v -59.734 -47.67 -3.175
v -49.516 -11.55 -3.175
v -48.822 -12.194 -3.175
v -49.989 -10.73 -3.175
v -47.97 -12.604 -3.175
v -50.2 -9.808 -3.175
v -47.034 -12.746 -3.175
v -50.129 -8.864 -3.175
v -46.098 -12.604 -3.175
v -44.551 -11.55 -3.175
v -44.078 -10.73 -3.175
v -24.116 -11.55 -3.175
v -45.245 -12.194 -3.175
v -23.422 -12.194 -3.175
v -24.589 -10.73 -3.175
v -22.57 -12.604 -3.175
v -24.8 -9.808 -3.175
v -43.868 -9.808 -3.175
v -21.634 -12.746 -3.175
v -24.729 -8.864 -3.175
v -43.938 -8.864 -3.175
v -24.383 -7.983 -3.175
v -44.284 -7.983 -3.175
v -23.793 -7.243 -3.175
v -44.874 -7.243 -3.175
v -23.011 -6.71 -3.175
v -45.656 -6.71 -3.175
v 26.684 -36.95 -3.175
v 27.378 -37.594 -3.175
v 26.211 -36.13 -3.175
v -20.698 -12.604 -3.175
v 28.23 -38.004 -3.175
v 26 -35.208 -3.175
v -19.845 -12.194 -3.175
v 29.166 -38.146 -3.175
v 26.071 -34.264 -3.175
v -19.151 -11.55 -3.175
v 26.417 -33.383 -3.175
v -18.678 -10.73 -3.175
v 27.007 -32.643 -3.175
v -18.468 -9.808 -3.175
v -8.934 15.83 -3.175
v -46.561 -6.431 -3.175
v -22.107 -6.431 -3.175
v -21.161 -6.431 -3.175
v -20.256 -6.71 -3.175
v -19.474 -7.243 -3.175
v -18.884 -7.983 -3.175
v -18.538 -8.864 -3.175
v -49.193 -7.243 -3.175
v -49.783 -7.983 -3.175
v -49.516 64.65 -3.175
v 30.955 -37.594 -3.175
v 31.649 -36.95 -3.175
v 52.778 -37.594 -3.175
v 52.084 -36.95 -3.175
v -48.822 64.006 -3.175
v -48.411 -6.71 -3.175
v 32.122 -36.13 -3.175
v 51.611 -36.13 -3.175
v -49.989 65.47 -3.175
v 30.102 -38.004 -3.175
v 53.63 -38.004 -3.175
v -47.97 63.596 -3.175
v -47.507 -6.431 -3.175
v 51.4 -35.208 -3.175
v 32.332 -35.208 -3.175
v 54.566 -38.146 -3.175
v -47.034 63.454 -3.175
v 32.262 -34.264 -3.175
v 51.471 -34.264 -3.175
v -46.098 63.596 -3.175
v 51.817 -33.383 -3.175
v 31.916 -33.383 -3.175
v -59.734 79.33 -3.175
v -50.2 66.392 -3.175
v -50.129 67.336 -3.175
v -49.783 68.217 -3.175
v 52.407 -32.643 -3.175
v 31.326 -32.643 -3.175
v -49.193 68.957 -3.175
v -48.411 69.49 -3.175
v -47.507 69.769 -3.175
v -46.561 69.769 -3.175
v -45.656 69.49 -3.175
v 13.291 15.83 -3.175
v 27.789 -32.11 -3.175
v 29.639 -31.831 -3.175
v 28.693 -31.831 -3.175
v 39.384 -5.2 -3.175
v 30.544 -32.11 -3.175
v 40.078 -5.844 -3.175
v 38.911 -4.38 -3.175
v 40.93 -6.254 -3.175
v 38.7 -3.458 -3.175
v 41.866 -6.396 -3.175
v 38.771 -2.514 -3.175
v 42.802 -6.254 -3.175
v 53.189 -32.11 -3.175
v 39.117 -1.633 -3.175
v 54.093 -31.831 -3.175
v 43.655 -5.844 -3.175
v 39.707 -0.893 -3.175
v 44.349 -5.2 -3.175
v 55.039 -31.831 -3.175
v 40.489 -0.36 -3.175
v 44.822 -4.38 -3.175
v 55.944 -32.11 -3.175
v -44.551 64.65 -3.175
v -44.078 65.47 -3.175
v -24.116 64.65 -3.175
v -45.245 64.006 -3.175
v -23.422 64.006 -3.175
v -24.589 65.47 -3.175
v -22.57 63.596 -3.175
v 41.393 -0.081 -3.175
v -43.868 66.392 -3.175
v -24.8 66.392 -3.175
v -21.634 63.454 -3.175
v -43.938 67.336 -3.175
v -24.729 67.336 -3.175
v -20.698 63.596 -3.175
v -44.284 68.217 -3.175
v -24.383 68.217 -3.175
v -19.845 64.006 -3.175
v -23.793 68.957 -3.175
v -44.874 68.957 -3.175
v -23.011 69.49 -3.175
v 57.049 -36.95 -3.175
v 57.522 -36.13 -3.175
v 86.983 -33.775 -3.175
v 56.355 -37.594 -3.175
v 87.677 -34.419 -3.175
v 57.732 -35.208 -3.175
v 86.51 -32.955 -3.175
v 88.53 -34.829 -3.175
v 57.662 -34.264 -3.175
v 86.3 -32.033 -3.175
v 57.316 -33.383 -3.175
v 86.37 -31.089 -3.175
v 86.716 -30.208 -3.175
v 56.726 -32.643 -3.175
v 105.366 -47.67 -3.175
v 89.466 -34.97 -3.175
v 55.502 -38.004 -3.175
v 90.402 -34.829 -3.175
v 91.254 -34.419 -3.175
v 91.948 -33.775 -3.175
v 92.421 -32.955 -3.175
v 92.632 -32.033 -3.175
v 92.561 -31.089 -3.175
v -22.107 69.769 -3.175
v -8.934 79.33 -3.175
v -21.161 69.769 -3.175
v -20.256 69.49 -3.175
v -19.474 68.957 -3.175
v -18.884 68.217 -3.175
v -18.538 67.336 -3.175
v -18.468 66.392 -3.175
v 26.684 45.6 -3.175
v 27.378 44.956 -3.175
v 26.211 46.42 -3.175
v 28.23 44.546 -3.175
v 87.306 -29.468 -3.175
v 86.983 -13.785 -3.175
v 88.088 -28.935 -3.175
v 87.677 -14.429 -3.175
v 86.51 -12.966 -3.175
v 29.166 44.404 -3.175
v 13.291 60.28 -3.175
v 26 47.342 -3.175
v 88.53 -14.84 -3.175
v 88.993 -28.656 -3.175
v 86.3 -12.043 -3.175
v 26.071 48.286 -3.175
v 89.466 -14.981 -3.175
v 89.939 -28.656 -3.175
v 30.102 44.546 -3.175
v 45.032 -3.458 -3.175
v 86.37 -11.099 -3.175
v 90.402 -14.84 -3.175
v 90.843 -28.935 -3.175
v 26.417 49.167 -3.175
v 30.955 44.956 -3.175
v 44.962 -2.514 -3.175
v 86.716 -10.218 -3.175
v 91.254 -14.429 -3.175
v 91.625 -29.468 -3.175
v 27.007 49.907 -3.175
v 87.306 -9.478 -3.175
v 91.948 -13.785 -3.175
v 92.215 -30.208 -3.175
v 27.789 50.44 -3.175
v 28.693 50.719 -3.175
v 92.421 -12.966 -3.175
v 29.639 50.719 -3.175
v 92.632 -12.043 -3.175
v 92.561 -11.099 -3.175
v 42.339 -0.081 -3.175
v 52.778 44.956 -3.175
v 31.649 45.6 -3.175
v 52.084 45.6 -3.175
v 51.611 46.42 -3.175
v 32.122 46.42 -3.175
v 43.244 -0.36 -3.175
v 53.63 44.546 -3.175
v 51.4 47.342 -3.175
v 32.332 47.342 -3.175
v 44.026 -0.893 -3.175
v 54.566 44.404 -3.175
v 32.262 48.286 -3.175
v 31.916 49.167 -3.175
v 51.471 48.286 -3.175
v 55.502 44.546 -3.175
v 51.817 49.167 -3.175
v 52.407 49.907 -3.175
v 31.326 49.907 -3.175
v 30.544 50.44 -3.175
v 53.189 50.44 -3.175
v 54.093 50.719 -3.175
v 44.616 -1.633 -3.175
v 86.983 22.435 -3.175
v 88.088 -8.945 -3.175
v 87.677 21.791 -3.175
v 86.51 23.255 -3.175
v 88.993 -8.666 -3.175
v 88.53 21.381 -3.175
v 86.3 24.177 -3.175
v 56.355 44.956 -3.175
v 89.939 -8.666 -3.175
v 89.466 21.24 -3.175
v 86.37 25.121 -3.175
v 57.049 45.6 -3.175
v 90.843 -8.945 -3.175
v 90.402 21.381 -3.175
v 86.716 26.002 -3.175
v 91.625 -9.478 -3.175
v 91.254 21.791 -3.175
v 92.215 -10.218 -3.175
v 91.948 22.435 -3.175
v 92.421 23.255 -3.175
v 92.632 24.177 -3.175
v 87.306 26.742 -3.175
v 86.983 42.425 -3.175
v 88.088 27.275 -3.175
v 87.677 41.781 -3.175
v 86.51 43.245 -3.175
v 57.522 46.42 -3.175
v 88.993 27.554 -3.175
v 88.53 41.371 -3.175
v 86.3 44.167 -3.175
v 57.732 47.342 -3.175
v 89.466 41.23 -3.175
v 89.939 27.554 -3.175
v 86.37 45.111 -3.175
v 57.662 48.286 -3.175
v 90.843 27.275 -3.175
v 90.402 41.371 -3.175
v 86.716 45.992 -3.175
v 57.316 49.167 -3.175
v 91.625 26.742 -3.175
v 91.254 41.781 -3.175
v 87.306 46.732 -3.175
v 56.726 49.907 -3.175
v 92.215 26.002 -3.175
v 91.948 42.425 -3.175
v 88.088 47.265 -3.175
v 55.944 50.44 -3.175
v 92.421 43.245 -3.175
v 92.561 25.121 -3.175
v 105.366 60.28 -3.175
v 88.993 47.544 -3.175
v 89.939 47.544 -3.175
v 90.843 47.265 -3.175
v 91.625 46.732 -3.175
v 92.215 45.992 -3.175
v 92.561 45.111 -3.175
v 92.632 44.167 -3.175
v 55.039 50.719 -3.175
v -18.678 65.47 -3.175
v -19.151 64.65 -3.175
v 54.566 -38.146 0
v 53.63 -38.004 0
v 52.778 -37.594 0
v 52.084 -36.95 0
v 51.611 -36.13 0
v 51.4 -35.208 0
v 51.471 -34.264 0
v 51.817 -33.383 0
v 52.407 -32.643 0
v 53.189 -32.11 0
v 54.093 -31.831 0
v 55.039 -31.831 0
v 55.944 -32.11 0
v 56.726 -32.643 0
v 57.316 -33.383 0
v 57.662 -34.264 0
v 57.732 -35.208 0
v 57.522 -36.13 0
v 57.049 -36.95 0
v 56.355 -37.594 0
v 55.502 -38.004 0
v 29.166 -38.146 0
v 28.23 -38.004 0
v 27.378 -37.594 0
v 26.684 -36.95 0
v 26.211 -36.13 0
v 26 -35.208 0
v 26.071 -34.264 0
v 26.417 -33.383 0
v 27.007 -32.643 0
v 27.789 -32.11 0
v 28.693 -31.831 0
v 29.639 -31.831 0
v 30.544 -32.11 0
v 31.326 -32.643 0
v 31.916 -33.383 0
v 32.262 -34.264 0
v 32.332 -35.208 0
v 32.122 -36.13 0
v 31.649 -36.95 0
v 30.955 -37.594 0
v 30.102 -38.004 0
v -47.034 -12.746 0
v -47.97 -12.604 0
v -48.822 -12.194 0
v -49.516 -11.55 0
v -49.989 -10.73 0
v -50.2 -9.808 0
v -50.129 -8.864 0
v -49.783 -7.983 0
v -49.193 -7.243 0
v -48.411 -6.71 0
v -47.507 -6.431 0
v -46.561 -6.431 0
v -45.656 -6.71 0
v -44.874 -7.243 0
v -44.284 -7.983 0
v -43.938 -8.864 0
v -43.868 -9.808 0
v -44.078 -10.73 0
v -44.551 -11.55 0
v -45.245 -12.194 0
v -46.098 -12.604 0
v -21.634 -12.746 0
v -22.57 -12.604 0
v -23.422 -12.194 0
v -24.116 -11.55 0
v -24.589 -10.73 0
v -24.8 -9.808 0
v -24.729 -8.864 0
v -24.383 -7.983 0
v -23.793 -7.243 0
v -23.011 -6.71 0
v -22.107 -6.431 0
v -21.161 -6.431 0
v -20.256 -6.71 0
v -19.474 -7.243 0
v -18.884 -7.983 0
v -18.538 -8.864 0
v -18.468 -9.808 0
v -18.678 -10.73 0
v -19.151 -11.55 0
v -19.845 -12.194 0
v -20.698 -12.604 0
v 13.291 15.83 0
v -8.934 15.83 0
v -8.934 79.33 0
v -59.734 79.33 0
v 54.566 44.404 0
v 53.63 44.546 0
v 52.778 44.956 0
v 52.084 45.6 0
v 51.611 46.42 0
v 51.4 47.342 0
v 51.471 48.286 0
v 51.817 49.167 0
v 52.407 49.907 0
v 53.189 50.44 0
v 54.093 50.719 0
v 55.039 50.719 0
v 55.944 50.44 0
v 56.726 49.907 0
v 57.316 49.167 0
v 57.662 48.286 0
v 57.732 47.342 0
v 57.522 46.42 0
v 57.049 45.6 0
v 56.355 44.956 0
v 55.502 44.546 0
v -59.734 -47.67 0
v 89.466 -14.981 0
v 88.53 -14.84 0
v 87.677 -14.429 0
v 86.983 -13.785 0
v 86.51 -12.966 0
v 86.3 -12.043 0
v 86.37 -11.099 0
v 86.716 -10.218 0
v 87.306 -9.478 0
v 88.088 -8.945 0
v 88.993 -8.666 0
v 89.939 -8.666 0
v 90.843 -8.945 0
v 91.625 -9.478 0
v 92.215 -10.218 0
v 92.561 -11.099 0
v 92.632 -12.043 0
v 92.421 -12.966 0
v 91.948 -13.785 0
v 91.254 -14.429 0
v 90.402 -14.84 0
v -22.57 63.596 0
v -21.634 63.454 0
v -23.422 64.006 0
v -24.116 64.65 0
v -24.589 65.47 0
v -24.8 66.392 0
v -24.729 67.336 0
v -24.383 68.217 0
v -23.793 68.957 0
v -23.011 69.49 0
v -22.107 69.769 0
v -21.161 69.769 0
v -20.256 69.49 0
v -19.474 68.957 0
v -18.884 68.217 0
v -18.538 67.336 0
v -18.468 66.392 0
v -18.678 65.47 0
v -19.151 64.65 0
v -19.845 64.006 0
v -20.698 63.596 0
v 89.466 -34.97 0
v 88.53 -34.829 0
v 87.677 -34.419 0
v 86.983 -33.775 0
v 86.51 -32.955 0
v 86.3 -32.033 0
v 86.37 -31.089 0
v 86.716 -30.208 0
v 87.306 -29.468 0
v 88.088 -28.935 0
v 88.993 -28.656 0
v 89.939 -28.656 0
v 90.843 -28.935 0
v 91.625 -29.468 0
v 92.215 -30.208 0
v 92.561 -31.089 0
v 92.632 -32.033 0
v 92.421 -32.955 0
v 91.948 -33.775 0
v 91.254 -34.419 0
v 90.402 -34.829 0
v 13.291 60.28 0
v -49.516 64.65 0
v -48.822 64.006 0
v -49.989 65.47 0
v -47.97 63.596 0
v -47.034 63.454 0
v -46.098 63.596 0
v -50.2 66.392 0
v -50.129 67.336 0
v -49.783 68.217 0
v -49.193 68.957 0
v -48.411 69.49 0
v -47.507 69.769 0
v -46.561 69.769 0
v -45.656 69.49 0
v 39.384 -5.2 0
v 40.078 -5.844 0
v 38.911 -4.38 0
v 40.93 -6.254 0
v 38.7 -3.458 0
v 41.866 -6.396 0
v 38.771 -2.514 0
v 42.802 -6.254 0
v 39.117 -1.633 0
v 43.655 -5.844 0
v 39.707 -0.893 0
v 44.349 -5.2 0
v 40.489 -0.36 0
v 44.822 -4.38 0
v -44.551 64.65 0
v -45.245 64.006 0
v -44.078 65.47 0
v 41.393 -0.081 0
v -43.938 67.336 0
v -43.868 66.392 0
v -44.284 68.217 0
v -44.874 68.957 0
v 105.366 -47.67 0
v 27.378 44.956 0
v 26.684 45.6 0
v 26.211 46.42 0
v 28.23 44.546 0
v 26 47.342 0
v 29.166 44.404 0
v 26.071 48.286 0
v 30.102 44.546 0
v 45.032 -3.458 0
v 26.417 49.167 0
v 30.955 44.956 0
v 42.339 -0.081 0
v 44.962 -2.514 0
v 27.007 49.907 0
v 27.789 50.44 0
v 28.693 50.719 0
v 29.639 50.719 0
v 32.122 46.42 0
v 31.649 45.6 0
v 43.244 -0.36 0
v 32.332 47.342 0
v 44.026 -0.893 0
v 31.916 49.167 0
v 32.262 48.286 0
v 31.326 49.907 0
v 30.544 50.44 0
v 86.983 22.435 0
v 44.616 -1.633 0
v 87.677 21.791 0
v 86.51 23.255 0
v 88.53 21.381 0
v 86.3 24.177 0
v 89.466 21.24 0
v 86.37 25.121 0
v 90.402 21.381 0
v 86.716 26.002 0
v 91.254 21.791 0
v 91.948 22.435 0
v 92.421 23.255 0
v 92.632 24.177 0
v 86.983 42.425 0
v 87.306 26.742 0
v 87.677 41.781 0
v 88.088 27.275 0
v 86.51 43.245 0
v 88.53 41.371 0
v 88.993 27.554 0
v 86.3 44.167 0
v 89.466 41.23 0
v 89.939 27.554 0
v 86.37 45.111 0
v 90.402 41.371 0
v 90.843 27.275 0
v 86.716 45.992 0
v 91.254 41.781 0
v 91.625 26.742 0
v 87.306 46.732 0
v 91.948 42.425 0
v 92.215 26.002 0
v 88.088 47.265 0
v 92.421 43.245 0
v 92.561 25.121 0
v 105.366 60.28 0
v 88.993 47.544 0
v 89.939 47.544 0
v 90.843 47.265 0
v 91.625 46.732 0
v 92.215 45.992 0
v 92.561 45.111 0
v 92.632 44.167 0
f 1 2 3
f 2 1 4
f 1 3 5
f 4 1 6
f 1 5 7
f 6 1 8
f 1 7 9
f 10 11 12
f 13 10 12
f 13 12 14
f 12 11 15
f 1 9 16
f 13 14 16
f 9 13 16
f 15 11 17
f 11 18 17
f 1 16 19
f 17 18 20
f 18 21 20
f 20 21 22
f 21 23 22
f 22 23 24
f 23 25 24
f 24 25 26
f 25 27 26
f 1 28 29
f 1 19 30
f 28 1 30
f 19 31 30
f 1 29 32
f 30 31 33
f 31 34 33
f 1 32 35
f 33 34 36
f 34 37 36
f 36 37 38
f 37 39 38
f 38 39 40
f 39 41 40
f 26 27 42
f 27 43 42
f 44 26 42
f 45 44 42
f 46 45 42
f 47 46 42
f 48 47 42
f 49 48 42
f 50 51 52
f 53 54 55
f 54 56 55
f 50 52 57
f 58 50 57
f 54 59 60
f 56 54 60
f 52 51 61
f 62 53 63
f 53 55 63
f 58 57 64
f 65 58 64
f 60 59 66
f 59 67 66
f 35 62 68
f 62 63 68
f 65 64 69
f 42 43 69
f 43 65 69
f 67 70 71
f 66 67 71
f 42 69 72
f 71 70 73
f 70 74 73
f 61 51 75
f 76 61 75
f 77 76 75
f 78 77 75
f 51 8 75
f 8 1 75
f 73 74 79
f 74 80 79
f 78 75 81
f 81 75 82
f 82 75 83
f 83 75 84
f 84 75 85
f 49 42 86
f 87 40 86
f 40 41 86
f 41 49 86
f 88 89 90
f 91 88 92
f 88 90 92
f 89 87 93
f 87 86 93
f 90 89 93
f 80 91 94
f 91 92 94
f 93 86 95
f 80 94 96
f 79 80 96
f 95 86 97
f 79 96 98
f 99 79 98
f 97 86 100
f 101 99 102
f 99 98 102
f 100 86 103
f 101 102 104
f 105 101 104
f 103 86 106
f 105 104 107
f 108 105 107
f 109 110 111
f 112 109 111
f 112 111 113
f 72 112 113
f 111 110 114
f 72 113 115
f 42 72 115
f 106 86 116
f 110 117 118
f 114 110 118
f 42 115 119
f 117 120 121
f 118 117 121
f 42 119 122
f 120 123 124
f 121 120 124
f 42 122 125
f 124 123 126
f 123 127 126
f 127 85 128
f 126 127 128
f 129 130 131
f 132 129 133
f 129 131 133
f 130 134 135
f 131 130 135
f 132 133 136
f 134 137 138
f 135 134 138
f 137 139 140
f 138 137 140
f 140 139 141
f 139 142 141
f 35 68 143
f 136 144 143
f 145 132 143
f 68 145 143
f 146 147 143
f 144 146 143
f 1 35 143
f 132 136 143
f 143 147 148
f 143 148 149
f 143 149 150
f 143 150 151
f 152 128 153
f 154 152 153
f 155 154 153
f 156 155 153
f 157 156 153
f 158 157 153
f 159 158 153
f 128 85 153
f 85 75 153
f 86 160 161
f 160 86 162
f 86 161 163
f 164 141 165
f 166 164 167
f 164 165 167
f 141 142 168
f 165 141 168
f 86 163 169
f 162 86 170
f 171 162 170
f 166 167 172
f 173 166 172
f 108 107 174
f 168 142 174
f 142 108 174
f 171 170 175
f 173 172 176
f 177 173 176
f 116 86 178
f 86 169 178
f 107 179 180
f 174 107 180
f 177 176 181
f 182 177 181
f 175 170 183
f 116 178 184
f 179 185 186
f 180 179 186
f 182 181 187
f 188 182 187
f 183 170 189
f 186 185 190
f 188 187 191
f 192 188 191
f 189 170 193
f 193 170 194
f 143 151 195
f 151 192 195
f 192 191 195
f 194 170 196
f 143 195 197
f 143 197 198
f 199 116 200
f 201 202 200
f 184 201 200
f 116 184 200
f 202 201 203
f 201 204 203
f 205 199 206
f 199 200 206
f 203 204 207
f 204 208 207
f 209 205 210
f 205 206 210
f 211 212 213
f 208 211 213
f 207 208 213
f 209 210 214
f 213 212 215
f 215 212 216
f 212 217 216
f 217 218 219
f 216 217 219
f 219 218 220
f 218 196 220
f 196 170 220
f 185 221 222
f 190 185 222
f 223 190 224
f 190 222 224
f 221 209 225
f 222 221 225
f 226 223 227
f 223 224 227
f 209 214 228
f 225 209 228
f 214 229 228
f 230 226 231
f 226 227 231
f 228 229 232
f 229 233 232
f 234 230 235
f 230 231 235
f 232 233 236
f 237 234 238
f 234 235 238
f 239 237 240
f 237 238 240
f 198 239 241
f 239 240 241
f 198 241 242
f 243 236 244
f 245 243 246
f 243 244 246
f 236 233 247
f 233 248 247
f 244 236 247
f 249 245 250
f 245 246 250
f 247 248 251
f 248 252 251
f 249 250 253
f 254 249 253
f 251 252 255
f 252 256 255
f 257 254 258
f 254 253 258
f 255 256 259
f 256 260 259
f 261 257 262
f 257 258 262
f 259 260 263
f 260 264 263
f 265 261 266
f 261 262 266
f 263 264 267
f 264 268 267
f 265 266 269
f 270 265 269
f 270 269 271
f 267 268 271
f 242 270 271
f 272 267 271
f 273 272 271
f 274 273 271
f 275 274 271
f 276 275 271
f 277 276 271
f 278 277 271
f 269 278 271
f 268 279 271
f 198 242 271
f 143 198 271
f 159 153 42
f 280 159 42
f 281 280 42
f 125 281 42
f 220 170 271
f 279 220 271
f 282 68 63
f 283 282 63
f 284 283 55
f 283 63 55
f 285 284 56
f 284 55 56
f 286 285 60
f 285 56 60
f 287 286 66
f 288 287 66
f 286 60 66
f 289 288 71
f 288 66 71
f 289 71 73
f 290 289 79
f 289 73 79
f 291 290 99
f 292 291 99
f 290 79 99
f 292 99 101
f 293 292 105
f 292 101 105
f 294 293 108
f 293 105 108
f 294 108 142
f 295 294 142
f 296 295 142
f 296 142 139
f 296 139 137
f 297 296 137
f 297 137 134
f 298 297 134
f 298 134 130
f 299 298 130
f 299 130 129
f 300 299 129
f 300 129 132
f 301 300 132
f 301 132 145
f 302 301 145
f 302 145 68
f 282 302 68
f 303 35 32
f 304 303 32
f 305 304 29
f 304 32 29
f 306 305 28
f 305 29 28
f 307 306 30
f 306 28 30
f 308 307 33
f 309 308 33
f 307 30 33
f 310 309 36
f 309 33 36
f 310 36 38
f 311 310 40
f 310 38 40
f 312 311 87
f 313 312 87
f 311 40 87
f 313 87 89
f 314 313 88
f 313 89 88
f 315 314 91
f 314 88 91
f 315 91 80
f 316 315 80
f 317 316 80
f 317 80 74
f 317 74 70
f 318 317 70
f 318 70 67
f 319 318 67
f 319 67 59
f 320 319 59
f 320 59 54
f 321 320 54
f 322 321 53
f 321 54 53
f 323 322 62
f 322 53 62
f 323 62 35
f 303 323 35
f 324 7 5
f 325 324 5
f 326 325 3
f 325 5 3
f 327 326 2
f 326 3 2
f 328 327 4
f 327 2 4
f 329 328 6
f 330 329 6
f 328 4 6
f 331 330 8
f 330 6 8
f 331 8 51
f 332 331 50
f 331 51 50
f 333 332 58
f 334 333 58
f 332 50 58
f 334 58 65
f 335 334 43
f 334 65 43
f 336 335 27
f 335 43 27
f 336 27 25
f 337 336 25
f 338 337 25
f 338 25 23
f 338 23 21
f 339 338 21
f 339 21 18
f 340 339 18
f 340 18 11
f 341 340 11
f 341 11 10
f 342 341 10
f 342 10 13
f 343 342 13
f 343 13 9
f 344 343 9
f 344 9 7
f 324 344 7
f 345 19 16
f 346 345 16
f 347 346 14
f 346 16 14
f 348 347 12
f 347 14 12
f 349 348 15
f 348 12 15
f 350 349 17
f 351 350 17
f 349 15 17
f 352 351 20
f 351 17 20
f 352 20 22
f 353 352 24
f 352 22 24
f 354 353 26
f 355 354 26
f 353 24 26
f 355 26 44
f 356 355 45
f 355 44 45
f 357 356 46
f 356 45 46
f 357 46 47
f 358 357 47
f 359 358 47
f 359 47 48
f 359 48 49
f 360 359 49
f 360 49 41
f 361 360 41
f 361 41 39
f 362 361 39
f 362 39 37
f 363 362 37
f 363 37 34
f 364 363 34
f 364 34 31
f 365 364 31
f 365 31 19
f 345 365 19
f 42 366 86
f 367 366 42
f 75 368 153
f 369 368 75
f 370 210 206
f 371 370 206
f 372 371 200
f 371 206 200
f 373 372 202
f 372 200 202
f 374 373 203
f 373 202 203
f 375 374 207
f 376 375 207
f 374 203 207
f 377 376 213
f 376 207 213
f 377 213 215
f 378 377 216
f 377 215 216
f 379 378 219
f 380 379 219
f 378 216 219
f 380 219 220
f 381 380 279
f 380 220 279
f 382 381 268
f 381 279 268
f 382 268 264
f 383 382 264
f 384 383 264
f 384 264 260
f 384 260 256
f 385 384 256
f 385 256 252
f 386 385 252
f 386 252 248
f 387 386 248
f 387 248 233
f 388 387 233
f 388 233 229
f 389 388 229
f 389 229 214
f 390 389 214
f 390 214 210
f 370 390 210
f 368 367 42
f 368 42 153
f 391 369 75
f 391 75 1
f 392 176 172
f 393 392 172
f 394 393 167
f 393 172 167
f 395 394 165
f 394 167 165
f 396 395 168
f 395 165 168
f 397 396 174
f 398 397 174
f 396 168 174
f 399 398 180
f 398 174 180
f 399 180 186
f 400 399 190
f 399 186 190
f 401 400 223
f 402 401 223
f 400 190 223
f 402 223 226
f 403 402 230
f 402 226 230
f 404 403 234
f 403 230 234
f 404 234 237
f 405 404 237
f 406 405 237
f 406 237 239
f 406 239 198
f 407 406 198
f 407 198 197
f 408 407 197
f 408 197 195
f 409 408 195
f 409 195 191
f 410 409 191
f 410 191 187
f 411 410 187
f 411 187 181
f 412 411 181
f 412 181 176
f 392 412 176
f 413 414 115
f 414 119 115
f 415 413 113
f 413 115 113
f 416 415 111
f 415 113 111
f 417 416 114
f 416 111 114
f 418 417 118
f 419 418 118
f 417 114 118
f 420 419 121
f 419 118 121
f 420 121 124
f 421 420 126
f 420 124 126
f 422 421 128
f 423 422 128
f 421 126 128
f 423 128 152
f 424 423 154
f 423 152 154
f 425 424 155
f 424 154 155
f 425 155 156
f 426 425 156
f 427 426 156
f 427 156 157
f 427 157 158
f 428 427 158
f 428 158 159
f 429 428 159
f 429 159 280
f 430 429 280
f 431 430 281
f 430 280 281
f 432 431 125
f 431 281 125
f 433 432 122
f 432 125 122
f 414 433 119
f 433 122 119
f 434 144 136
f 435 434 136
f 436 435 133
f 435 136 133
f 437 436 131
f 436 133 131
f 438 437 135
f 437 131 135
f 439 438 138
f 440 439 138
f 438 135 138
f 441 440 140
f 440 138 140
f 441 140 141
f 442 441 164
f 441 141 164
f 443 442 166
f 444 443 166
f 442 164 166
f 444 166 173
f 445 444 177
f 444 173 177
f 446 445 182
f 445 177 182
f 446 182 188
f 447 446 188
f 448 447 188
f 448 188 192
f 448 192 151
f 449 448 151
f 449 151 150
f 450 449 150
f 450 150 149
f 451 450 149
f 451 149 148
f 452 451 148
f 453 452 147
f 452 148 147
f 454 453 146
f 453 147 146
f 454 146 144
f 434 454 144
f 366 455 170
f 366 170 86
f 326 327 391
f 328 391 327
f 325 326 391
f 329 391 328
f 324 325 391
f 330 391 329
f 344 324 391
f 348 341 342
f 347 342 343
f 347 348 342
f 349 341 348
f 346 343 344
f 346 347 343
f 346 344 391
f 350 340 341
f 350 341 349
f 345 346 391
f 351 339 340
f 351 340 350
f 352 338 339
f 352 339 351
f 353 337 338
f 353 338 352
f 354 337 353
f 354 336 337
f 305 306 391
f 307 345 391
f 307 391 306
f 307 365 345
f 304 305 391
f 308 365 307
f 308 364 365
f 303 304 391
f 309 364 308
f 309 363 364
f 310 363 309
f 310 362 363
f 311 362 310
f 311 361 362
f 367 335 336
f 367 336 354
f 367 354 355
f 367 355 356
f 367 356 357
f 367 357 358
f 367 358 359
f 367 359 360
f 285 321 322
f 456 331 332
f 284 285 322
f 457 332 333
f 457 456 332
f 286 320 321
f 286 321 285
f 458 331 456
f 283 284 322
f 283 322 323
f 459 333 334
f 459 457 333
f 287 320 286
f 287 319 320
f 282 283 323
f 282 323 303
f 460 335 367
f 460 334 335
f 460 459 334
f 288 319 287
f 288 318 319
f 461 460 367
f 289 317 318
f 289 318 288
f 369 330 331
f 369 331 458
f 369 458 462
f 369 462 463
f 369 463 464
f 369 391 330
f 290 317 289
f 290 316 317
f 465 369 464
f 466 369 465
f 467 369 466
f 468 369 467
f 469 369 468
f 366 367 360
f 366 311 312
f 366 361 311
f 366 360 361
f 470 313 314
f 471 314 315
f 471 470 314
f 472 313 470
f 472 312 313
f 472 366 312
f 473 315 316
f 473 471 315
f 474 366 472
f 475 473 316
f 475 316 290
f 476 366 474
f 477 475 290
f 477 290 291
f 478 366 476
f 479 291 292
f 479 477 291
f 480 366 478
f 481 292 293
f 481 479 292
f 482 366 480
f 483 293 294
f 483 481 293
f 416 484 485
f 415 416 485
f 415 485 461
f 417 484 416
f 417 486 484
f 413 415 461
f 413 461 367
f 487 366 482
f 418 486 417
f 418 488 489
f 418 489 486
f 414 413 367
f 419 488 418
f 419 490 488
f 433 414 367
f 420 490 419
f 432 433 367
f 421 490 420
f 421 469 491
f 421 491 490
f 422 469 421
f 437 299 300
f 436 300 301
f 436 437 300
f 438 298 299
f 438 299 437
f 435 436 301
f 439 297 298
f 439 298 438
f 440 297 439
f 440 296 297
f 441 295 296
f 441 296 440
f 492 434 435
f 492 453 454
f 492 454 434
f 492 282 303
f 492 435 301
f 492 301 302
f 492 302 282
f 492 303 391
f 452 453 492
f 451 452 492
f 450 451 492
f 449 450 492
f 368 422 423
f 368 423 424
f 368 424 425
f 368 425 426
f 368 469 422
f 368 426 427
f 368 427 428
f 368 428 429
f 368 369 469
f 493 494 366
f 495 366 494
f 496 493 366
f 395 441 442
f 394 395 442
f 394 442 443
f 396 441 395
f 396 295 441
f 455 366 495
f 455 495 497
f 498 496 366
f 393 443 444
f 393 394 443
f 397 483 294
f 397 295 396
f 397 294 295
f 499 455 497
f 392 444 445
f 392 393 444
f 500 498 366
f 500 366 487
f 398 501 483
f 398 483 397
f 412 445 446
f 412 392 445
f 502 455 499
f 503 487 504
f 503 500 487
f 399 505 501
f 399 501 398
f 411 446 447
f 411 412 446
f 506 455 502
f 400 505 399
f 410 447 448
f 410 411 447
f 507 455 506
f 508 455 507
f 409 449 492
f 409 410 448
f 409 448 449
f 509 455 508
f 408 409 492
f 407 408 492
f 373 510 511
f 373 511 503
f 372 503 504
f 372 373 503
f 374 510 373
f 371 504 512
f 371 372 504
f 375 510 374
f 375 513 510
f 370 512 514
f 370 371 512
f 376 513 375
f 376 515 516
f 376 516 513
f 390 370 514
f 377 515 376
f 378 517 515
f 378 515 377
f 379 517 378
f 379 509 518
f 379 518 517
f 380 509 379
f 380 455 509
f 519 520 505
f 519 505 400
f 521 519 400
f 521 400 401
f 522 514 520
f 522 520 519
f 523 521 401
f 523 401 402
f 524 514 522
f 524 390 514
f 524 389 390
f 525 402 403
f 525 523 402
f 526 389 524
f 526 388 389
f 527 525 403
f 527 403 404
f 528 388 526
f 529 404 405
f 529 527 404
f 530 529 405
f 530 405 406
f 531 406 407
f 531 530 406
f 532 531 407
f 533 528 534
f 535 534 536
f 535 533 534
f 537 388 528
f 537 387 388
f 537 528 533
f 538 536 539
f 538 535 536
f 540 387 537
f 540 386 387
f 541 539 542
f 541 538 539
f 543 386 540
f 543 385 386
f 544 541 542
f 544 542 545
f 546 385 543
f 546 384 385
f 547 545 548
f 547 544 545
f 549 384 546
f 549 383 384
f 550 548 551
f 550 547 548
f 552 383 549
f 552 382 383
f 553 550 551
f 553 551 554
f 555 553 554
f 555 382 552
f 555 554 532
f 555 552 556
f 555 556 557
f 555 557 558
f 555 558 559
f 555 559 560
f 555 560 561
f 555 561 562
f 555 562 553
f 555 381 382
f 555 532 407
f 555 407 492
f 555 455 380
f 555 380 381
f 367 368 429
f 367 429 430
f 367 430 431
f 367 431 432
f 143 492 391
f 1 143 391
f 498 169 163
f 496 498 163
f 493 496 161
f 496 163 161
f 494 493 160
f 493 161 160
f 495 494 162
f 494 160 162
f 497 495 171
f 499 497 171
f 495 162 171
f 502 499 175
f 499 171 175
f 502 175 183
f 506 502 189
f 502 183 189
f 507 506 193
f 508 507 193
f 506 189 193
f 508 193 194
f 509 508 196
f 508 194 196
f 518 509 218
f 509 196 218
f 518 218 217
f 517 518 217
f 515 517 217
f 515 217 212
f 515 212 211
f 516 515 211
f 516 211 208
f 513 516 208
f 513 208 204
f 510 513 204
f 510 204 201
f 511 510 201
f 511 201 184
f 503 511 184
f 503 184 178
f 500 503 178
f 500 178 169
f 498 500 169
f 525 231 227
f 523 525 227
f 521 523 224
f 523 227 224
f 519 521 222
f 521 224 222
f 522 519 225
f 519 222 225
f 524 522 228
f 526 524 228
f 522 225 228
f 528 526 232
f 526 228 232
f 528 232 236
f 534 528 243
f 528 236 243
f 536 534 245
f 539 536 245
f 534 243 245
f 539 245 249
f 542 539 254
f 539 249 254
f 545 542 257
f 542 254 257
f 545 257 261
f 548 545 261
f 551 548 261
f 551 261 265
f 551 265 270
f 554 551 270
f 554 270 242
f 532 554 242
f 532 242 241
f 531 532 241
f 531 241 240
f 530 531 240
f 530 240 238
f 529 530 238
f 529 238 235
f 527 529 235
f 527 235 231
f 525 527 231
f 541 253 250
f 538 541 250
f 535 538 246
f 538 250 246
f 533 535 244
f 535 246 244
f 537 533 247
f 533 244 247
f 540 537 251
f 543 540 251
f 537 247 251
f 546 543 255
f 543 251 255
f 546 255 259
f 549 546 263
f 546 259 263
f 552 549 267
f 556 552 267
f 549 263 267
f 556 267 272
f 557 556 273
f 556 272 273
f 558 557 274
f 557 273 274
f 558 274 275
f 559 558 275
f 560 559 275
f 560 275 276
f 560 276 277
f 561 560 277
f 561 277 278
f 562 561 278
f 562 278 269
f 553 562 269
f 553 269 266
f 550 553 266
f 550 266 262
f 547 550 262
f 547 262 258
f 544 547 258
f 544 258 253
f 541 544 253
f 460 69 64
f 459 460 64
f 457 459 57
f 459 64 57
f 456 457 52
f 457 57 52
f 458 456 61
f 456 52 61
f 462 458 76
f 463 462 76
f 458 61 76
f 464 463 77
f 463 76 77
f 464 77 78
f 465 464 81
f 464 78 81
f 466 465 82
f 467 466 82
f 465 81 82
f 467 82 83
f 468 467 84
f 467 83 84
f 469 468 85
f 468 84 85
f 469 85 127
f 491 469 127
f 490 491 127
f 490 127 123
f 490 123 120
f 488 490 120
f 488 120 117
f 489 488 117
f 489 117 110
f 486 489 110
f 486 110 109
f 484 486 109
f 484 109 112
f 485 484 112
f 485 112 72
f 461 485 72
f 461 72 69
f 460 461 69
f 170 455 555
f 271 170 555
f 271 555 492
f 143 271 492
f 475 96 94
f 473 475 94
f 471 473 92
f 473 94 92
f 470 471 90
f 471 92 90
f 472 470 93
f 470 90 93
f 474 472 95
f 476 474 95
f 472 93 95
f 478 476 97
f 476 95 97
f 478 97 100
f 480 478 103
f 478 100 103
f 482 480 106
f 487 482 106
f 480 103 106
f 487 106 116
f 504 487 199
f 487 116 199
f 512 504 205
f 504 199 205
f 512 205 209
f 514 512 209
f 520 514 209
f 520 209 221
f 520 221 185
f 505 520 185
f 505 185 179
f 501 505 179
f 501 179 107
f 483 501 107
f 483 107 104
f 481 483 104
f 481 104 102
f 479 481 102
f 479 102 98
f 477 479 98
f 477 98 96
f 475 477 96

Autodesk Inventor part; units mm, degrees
ref_plane "YZ Plane" through (0, 0, 0) normal (1, 0, 0) x (0, 1, 0)
ref_plane "XZ Plane" through (0, 0, 0) normal (0, 1, 0) x (-1, 0, 0)
ref_plane "XY Plane" through (0, 0, 0) normal (0, 0, 1) x (1, 0, 0)
sketch "Sketch1" plane through (0, 0, 0) normal (0, 0, 1) x (1, 0, 0)
  line L0 (-59.7338, 79.3295) -> (-59.7338, -47.6705)
  line L1 (-59.7338, -47.6705) -> (67.2662, -47.6705)
  line L2 (67.2662, -47.6705) -> (67.2662, 60.2795)
  line L3 (67.2662, 60.2795) -> (13.2912, 60.2795)
  line L4 (13.2912, 60.2795) -> (13.2912, 15.8295)
  line L5 (13.2912, 15.8295) -> (-8.9338, 15.8295)
  line L6 (-8.9338, 15.8295) -> (-8.9338, 79.3295)
  line L7 (-8.9338, 79.3295) -> (-59.7338, 79.3295)
  line L8 (67.2662, 60.2795) -> (105.3662, 60.2795)
  line L9 (105.3662, 60.2795) -> (105.3662, -47.6705)
  line L10 (105.3662, -47.6705) -> (67.2662, -47.6705)
  point P0 (0, 0)
  point P1 (-47.0338, 66.6295)
  point P2 (54.5662, 47.5795)
  point P3 (41.8662, -3.2205)
  point P4 (54.5662, -34.9705)
  point P5 (-47.0338, -9.5705)
  point P6 (89.4658, -31.7955)
  point P7 (89.4658, -11.8057)
  point P8 (-21.6338, 66.6295)
  point P9 (-21.6338, -9.5705)
  point P10 (29.1662, 47.5795)
  point P11 (54.5662, -34.9705)
  point P12 (54.5662, -9.5705)
  point P13 (29.1662, -34.9705)
  point P14 (89.4658, 44.4045)
  point P15 (89.4658, 24.4147)
  dimension "d0" = 127
  dimension "d1" = 127
  dimension "d2" = 50.8
  dimension "d3" = 53.975
  dimension "d4" = 107.95
  dimension "d5" = 63.5
  dimension "d6" = 12.7
  dimension "d7" = 12.7
  dimension "d8" = 12.7
  dimension "d9" = 12.7
  dimension "d10" = 44.45
  dimension "d11" = 25.4
  dimension "d21" = 12.7
  dimension "d22" = 12.7
  dimension "d23" = 12.7
  dimension "d24" = 38.1
  dimension "d25" = 38.1
  dimension "d26" = 107.95
  dimension "d27" = 15.875
  dimension "d28" = 19.9898
  dimension "d38" = 15.9004
  dimension "d39" = 15.9004
  dimension "d40" = 12.7
  dimension "d41" = 12.7
  dimension "d42" = 25.4
  dimension "d43" = 76.2
  dimension "d44" = 12.7
  dimension "d46" = 12.7
  dimension "d47" = 25.4
  dimension "d48" = 38.1
  dimension "d49" = 12.7
  dimension "d50" = 12.7
  dimension "d51" = 38.1
  dimension "d52" = 25.4
  dimension "d54" = 15.875
  dimension "d55" = 19.9898
  dimension "d56" = 15.9004
  dimension "d57" = 15.9004
extrude "Extrusion1" add sketch "Sketch1" against normal blind 3.175 contours L7 L6 L5 L4 L3 L2 L1 L0
hole "Hole1" at (-47.0338, 66.6295, 0) at (54.5662, 47.5795, 0) at (41.8662, -3.2205, 0) at (-47.0338, -9.5705, 0) at (54.5662, -34.9705, 0) at (89.4658, -31.7955, 0) at (89.4658, -11.8057, 0) at (-21.6338, 66.6295, 0) at (-21.6338, -9.5705, 0) at (29.1662, 47.5795, 0) at (29.1662, -34.9705, 0) direction (0, 0, -1) diameter 6.35 depth 25.4 tip angle 118
extrude "Extrusion2" add sketch "Sketch1" against normal blind 3.175 contours L2 L8 L9 L10
hole "Hole2" at (89.4658, -11.8057, 0) at (89.4658, -31.7955, 0) at (89.4658, 24.4147, 0) at (89.4658, 44.4045, 0) direction (0, 0, -1) diameter 6.35 depth 25.4 tip angle 118
properties part number "AS5-8-5-002"
